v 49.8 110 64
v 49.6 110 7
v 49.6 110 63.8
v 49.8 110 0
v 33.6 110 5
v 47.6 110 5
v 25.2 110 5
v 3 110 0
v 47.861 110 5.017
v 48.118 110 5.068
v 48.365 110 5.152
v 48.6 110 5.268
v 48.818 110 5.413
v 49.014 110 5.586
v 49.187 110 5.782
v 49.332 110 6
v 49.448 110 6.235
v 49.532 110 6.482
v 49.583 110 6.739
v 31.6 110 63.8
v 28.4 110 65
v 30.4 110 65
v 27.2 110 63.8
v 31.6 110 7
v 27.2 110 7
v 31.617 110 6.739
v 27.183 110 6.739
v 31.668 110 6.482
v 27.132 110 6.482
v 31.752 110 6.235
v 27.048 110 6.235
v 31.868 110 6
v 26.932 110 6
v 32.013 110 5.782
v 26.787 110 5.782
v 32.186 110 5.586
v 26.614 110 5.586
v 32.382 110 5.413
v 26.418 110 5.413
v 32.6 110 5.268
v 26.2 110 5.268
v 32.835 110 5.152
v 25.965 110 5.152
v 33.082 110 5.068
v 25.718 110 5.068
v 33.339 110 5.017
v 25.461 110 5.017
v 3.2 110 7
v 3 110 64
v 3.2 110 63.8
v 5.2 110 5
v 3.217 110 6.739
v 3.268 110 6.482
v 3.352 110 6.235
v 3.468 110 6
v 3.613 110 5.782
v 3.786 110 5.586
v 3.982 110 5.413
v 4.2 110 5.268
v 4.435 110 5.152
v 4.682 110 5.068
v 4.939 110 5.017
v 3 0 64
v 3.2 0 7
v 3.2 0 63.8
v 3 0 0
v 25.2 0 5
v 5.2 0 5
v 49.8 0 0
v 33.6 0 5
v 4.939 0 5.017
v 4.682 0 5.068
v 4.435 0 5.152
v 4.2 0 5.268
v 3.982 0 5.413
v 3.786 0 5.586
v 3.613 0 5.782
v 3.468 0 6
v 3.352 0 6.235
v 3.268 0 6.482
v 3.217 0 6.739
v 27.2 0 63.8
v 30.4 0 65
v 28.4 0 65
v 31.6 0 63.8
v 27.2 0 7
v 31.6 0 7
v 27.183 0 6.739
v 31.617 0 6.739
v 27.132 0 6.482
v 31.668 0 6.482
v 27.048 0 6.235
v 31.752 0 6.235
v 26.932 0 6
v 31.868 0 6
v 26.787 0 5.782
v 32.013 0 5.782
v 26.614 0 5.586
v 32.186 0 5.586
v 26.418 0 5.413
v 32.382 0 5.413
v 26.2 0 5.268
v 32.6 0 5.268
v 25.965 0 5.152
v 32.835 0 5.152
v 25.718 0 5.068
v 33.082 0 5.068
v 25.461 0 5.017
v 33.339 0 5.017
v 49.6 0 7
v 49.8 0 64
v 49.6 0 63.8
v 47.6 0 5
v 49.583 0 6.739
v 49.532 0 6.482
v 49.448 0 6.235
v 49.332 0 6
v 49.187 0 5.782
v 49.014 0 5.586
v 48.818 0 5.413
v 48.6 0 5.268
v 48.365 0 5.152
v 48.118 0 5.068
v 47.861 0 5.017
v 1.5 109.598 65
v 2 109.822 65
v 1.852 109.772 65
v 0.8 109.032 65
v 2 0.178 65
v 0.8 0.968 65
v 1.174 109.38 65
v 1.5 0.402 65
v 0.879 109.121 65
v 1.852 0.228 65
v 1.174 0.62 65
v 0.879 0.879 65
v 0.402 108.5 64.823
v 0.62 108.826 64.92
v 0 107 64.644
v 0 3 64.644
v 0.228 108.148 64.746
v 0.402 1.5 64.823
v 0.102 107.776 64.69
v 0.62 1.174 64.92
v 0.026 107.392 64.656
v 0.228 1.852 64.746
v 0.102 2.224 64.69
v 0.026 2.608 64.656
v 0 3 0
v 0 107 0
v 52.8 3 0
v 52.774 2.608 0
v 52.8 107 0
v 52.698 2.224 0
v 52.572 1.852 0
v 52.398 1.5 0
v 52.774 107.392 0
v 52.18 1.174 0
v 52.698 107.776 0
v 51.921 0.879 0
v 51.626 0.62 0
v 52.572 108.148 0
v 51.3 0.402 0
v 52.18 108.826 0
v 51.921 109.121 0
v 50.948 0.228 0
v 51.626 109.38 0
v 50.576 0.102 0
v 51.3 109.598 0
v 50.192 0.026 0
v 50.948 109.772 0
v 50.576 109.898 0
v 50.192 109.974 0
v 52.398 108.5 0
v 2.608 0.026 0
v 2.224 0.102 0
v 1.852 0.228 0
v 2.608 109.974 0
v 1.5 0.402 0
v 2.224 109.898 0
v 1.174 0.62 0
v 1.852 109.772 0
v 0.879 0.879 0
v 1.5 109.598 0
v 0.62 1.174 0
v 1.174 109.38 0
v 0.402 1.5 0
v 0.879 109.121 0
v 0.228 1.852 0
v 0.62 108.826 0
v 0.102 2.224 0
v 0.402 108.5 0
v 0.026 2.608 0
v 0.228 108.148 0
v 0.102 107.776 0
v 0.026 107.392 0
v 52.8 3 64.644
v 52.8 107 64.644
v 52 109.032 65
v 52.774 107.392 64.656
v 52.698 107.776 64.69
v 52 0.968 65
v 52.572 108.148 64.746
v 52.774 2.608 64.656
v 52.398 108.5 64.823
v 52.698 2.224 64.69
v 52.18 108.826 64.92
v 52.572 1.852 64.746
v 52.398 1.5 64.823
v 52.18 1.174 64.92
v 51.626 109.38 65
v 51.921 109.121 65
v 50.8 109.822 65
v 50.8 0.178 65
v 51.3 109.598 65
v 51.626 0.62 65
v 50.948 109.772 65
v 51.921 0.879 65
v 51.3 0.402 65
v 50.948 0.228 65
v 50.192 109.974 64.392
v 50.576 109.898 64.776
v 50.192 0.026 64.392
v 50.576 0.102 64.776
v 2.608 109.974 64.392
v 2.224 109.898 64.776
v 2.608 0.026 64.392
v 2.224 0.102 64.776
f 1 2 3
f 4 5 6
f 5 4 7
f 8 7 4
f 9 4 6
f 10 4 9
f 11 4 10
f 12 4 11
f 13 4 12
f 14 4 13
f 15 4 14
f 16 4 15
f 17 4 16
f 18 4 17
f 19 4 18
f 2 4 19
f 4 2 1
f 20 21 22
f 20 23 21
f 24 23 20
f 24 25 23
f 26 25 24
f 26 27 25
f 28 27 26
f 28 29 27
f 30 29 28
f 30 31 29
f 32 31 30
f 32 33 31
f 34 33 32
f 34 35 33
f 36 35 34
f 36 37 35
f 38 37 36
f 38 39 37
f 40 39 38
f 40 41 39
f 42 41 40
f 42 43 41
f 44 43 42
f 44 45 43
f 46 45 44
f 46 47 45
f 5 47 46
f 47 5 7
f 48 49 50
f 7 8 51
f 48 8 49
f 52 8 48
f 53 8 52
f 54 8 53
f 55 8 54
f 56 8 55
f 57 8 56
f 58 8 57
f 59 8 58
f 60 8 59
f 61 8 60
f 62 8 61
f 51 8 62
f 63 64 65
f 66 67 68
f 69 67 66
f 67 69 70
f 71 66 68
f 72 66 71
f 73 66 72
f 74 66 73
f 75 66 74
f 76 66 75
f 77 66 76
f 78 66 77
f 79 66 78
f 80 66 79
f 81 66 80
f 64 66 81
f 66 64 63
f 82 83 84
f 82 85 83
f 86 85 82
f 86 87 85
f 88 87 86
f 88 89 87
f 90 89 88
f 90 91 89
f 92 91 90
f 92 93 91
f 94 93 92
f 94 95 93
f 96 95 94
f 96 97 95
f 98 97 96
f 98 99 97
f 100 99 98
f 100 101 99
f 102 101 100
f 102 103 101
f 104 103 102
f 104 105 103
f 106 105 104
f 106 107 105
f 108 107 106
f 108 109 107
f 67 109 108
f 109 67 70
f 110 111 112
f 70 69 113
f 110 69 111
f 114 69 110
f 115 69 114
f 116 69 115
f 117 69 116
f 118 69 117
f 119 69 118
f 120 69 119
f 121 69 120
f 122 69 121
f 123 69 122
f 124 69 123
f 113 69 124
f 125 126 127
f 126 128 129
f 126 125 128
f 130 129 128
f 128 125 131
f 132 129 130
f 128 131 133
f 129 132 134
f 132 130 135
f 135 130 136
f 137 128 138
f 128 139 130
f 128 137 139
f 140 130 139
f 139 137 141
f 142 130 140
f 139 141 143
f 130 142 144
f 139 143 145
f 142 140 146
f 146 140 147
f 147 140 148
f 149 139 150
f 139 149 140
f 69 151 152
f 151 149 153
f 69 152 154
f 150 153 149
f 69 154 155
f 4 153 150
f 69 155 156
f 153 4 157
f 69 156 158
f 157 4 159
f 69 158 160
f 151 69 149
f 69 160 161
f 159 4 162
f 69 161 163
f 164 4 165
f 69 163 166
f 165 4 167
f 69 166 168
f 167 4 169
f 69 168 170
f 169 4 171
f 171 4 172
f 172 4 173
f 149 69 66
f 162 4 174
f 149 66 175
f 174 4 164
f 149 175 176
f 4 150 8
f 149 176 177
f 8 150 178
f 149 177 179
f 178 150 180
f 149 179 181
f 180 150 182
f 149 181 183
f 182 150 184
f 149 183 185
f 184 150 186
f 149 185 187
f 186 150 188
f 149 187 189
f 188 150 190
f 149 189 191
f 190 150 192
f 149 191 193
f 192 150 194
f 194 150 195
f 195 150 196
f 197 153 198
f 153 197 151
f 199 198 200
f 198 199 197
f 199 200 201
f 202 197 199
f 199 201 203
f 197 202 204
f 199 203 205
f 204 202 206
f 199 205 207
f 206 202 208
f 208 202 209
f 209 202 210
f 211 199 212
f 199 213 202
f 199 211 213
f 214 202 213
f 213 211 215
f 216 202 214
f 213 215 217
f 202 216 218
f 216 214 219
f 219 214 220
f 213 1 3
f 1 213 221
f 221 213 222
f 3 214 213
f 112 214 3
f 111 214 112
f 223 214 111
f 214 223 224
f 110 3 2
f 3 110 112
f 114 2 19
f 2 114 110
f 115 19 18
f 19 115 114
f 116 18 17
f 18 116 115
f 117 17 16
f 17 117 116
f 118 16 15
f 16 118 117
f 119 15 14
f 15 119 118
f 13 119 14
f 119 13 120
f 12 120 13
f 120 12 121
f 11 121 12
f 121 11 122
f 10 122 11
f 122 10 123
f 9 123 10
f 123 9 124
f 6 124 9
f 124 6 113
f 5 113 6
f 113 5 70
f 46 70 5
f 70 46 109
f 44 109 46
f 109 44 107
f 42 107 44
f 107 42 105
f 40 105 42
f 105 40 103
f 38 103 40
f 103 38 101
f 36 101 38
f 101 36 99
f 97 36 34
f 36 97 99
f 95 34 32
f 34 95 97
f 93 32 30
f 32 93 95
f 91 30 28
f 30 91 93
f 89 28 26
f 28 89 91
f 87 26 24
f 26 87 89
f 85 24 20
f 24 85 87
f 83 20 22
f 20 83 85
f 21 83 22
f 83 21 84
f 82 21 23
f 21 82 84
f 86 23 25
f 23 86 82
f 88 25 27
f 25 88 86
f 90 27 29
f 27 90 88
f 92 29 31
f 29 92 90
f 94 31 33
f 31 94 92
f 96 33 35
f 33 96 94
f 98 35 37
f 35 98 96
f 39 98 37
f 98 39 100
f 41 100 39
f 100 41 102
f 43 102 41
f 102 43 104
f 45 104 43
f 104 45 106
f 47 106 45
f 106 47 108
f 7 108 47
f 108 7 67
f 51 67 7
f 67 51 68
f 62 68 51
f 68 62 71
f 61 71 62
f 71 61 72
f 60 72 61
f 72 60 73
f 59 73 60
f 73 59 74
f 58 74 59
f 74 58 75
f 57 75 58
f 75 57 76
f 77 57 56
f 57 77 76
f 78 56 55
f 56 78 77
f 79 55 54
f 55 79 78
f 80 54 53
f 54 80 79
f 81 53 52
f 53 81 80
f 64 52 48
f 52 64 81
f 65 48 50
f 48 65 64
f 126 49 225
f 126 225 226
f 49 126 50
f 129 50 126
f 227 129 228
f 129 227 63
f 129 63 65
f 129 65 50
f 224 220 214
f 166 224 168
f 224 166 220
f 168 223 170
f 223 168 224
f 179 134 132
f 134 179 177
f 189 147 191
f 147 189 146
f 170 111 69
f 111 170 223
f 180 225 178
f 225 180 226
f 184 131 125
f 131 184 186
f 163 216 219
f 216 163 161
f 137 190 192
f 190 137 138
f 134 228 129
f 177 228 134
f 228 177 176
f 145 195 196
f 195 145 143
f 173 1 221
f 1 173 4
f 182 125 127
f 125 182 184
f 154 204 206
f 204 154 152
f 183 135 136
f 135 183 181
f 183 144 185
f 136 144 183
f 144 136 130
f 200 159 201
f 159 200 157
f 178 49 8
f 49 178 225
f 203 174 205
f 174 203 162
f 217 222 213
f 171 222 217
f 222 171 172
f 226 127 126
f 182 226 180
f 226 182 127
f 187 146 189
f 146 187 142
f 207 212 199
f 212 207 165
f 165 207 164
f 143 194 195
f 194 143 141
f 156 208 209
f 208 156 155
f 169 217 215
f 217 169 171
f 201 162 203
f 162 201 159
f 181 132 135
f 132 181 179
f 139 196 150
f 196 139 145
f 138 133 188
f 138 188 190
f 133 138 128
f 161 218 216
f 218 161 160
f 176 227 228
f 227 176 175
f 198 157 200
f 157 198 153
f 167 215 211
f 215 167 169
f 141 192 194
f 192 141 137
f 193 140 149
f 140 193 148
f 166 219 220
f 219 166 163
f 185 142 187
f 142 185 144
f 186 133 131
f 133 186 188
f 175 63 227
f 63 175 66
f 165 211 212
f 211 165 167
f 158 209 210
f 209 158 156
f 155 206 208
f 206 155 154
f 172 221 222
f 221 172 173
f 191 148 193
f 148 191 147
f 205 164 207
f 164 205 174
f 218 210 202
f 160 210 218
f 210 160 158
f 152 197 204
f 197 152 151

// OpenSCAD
// Vertikaler Laptop-/Tablet-Ständer, 2 Schlitze in einem Teil
// Alle Maße in Millimetern (Regel: units-mm)
//
// Kontext (Regel: context-first), Stand bei Erstellung:
//   - context/printer.md:    Anycubic Kobra S1, 0.4mm Düse, PEI, 250mm Bauraum
//   - context/tolerances.md: eff. XY-Fehler ~0.15–0.2mm/Seite. Hier irrelevant
//                            für die Funktion (kein Passsitz), aber er macht
//                            die Schlitze real ~0.3–0.4mm schmaler als nominal
//                            -> im Puffer unten schon berücksichtigt.
//   - context/materials.md:  noch leer -> PLA angenommen
//
// Anforderungen aus dem Design-Dialog:
//   - Laptop 20mm dick, "ein wenig Puffer" -> 2.0mm Luft pro Seite
//   - iPad 15mm dick (mit Hülle)           -> 1.5mm Luft pro Seite
//   - Ein Teil, beide Schlitze nebeneinander
//   - Geräte stehen senkrecht, straff geführt (keine Neigung)
//   - Minimalistisch und schmal: auf dem Schreibtisch ist wenig Breite frei
//
// Aufbau / Prinzip:
//   Ein massiver Sockel (floor_t) mit drei aufstehenden Rippen. Dazwischen
//   die beiden Schlitze. Die Schlitze laufen in Y komplett durch (vorne und
//   hinten offen) – das spart Material, macht das Teil leichter zu reinigen
//   und erlaubt es, den Laptop von jeder Seite einzuschieben.
//
//   Die schmale Seite (X, total_w ~52mm) zeigt zum Nutzer, die lange Seite
//   (Y, base_d 110mm) geht in die Tischtiefe. Der Laptop steht also mit
//   seiner Breitseite (~31cm) in Y -> auf dem Tisch verbraucht der Ständer
//   nur ~5cm Breite.
//
//   Schlitzmund und obere Außenkanten sind angefast (mouth_c), der
//   Schlitzgrund hat eine Hohlkehle (fillet_r). Die Fase erleichtert das
//   Einstellen ohne hinzusehen, die Hohlkehle nimmt die Biegespannung an
//   der Rippenwurzel auf – das ist die Stelle, an der so ein Ständer
//   bricht, wenn man seitlich gegen den Laptop kommt.
//
// Druckausrichtung: So wie das Teil steht, Sockelunterseite aufs Bett.
//   Keine Stützen nötig: die Schlitze öffnen nach oben, alle Fasen sind
//   45°-Flächen nach oben, es gibt keine Brücke und keinen Überhang.
//   Die plane 52 x 110mm Fläche auf PEI = sehr gute Haftung.
//   Empfehlung: Infill hoch (>=30%) oder mehr Perimeter – das Gewicht im
//   Sockel ist hier Funktion, nicht Verschwendung (Kippsicherheit).
//   Layerrichtung: die Rippen werden liegend aufgebaut, seitliche
//   Belastung zieht quer zu den Layern. Deshalb sind die Rippen mit 3–4mm
//   bewusst dick und haben unten die Hohlkehle.
//
// Nach dem Druck: 4 Filzgleiter unter den Sockel kleben. Das schützt den
//   Tisch und verhindert, dass der Ständer beim Einschieben wegrutscht.
//
// Anpassen: Laptop dicker/dünner -> nur laptop_t ändern, alles andere
//   rechnet sich mit. Wenn nur ein Gerät rein soll: ipad_slot_on = false.

/* [Geräte] */
// Dicke des Laptops (gemessen, geschlossen)
laptop_t = 20;
// Luft pro Seite im Laptop-Schlitz
laptop_gap = 2.0;
// Dicke des iPads inkl. Hülle
ipad_t = 15;
// Luft pro Seite im iPad-Schlitz
ipad_gap = 1.5;
// Zweiten Schlitz überhaupt bauen
ipad_slot_on = true;

/* [Ständer] */
// Wandstärke der beiden Außenrippen. Muss dicker sein als mouth_c + edge_c,
// sonst läuft die Rippe oben auf eine Schneide aus (siehe assert unten).
wall_t = 3.2;
// Wandstärke der Mittelrippe (trennt beide Schlitze, trägt von zwei Seiten)
mid_wall = 4.4;
// Höhe der Rippen über dem Schlitzgrund = Einstecktiefe des Geräts
wall_h = 60;
// Dicke des massiven Sockels unter den Schlitzen
floor_t = 5.0;
// Tiefe des Ständers (Y, in die Tischtiefe)
base_d = 110;

/* [Kanten] */
// Fase am Schlitzmund (Einführhilfe – die funktionale Fase)
mouth_c = 1.2;
// Fase an den oberen Außenkanten (nur Optik/Haptik, deshalb kleiner:
// mouth_c + edge_c fressen sonst die Rippe oben komplett auf)
edge_c = 0.8;
// Hohlkehle am Schlitzgrund (Kerbspannung an der Rippenwurzel)
fillet_r = 2.0;
// Radius der vier senkrechten Außenkanten
corner_r = 3.0;

/* [Qualität] */
$fn = 48;

// ---------------------------------------------------------------------------
// Abgeleitete Maße
// ---------------------------------------------------------------------------

laptop_w = laptop_t + 2 * laptop_gap;   // lichte Schlitzbreite Laptop
ipad_w   = ipad_t   + 2 * ipad_gap;     // lichte Schlitzbreite iPad

// X-Positionen der Rippen-/Schlitzkanten, von links
x1 = wall_t;                                            // Laptop-Schlitz links
x2 = x1 + laptop_w;                                     // Laptop-Schlitz rechts
x3 = x2 + (ipad_slot_on ? mid_wall : 0);                // iPad-Schlitz links
x4 = x3 + (ipad_slot_on ? ipad_w : 0);                  // iPad-Schlitz rechts

total_w = x4 + wall_t;
total_h = floor_t + wall_h;

// Kippsicherheit: Winkel, um den das Gerät+Ständer als Ganzes gekippt werden
// muss, bis der Schwerpunkt über die Sockelkante wandert. Schwerpunkt grob in
// halber Gerätehöhe angenommen (Laptop geschlossen ~220mm hoch).
device_h   = 220;
cog_z      = floor_t + device_h / 2;
tip_deg    = atan((total_w / 2) / cog_z);
// Spiel des Geräts im Schlitz: um so viel Grad kann es im Schlitz kippeln
play_deg_l = atan(2 * laptop_gap / wall_h);
play_deg_i = atan(2 * ipad_gap / wall_h);

// ---------------------------------------------------------------------------
// Prüfungen (Regel: printability-report – wird gemeldet, nicht stillschweigend
// korrigiert)
// ---------------------------------------------------------------------------

nozzle_d = 0.4;

// Restbreite der Rippen ganz oben, nachdem die Fasen abgezogen sind. Das ist
// die kritische Größe: läuft eine Rippe oben auf eine Schneide aus, kann der
// Drucker die letzten Layer nicht mehr sauber legen und die Kante wird
// ausgefranst und bröselig.
outer_top_w = wall_t   - mouth_c - edge_c;
mid_top_w   = mid_wall - 2 * mouth_c;

assert(wall_t   >= 2 * nozzle_d, "wall_t unter 2x Duesendurchmesser");
assert(mid_wall >= 2 * nozzle_d, "mid_wall unter 2x Duesendurchmesser");
assert(floor_t  >= 2 * nozzle_d, "floor_t unter 2x Duesendurchmesser");
assert(fillet_r <= wall_h,       "fillet_r groesser als die Rippenhoehe");
assert(outer_top_w >= 2 * nozzle_d,
       "Aussenrippe laeuft oben spitz zu: wall_t erhoehen oder Fasen kleiner");
assert(!ipad_slot_on || mid_top_w >= 2 * nozzle_d,
       "Mittelrippe laeuft oben spitz zu: mid_wall erhoehen oder mouth_c kleiner");
assert(mouth_c * 2 < min(laptop_w, ipad_slot_on ? ipad_w : 1e9),
       "mouth_c zu gross - die Fasen fressen den Schlitz auf");
assert(corner_r <= total_w / 2 && corner_r <= base_d / 2,
       "corner_r groesser als das halbe Teil");
assert(total_w <= 250 && base_d <= 250 && total_h <= 250,
       "passt nicht auf das Druckbett (250 x 250 x 250)");

echo(str("Aussenmasse (B x T x H): ", total_w, " x ", base_d, " x ", total_h, " mm"));
echo(str("Schlitz Laptop: ", laptop_w, " mm lichte Weite fuer ", laptop_t, " mm Geraet"));
echo(str("Schlitz iPad:   ", ipad_slot_on ? ipad_w : 0, " mm lichte Weite fuer ", ipad_t, " mm Geraet"));
echo(str("Kippwinkel Ganzes (Schwerpunkt ", cog_z, " mm hoch): ", tip_deg, " Grad"));
echo(str("Kippeln im Schlitz: Laptop ", play_deg_l, " Grad, iPad ", play_deg_i, " Grad"));
echo(str("Rippenbreite oben nach Fasen: aussen ", outer_top_w, " mm, mitte ", mid_top_w, " mm"));

// ---------------------------------------------------------------------------
// 2D-Querschnitt (X = Breite, Y der 2D-Ebene = Höhe Z des Teils)
// ---------------------------------------------------------------------------

// Material, das in eine Innenecke des Schlitzgrunds zurückgelegt wird:
// Quadrat minus Kreis = Hohlkehle. dir = +1 linke Ecke, -1 rechte Ecke.
module fillet_piece(x, dir) {
    r = fillet_r;
    translate([x, floor_t])
        difference() {
            translate([dir > 0 ? 0 : -r, 0]) square([r, r]);
            translate([dir * r, r]) circle(r = r);
        }
}

// Schnittfigur eines Schlitzes: Rechteck nach oben offen + Trichter am Mund.
module slot_cut(a, b) {
    c = mouth_c;
    union() {
        translate([a, floor_t]) square([b - a, total_h - floor_t + 1]);
        polygon([
            [a,     total_h - c],
            [b,     total_h - c],
            [b + c, total_h    ],
            [b + c, total_h + 1],
            [a - c, total_h + 1],
            [a - c, total_h    ]
        ]);
    }
}

module profile() {
    c = edge_c;
    union() {
        difference() {
            square([total_w, total_h]);

            slot_cut(x1, x2);
            if (ipad_slot_on) slot_cut(x3, x4);

            // Fasen an den oberen Außenkanten
            polygon([[-1, total_h - c], [c, total_h],
                     [c, total_h + 1], [-1, total_h + 1]]);
            polygon([[total_w + 1, total_h - c], [total_w - c, total_h],
                     [total_w - c, total_h + 1], [total_w + 1, total_h + 1]]);
        }

        // Hohlkehlen am Schlitzgrund
        fillet_piece(x1,  1);
        fillet_piece(x2, -1);
        if (ipad_slot_on) {
            fillet_piece(x3,  1);
            fillet_piece(x4, -1);
        }
    }
}

// ---------------------------------------------------------------------------
// Körper
// ---------------------------------------------------------------------------

// Grundriss mit gerundeten senkrechten Kanten (als Schnittkörper)
module footprint_prism() {
    linear_extrude(height = total_h + 2)
        offset(r = corner_r) offset(delta = -corner_r)
            square([total_w, base_d]);
}

module staender() {
    render(convexity = 8)
        intersection() {
            // Querschnitt entlang Y ausziehen
            rotate([90, 0, 0])
                translate([0, 0, -base_d])
                    linear_extrude(height = base_d)
                        profile();

            translate([0, 0, -1]) footprint_prism();
        }
}

// Auf false setzen (oder per CLI -D render_part=false), wenn die Datei nur
// als Modulquelle für Schnitt-/Prüfskripte eingebunden wird.
render_part = true;
if (render_part) staender();
